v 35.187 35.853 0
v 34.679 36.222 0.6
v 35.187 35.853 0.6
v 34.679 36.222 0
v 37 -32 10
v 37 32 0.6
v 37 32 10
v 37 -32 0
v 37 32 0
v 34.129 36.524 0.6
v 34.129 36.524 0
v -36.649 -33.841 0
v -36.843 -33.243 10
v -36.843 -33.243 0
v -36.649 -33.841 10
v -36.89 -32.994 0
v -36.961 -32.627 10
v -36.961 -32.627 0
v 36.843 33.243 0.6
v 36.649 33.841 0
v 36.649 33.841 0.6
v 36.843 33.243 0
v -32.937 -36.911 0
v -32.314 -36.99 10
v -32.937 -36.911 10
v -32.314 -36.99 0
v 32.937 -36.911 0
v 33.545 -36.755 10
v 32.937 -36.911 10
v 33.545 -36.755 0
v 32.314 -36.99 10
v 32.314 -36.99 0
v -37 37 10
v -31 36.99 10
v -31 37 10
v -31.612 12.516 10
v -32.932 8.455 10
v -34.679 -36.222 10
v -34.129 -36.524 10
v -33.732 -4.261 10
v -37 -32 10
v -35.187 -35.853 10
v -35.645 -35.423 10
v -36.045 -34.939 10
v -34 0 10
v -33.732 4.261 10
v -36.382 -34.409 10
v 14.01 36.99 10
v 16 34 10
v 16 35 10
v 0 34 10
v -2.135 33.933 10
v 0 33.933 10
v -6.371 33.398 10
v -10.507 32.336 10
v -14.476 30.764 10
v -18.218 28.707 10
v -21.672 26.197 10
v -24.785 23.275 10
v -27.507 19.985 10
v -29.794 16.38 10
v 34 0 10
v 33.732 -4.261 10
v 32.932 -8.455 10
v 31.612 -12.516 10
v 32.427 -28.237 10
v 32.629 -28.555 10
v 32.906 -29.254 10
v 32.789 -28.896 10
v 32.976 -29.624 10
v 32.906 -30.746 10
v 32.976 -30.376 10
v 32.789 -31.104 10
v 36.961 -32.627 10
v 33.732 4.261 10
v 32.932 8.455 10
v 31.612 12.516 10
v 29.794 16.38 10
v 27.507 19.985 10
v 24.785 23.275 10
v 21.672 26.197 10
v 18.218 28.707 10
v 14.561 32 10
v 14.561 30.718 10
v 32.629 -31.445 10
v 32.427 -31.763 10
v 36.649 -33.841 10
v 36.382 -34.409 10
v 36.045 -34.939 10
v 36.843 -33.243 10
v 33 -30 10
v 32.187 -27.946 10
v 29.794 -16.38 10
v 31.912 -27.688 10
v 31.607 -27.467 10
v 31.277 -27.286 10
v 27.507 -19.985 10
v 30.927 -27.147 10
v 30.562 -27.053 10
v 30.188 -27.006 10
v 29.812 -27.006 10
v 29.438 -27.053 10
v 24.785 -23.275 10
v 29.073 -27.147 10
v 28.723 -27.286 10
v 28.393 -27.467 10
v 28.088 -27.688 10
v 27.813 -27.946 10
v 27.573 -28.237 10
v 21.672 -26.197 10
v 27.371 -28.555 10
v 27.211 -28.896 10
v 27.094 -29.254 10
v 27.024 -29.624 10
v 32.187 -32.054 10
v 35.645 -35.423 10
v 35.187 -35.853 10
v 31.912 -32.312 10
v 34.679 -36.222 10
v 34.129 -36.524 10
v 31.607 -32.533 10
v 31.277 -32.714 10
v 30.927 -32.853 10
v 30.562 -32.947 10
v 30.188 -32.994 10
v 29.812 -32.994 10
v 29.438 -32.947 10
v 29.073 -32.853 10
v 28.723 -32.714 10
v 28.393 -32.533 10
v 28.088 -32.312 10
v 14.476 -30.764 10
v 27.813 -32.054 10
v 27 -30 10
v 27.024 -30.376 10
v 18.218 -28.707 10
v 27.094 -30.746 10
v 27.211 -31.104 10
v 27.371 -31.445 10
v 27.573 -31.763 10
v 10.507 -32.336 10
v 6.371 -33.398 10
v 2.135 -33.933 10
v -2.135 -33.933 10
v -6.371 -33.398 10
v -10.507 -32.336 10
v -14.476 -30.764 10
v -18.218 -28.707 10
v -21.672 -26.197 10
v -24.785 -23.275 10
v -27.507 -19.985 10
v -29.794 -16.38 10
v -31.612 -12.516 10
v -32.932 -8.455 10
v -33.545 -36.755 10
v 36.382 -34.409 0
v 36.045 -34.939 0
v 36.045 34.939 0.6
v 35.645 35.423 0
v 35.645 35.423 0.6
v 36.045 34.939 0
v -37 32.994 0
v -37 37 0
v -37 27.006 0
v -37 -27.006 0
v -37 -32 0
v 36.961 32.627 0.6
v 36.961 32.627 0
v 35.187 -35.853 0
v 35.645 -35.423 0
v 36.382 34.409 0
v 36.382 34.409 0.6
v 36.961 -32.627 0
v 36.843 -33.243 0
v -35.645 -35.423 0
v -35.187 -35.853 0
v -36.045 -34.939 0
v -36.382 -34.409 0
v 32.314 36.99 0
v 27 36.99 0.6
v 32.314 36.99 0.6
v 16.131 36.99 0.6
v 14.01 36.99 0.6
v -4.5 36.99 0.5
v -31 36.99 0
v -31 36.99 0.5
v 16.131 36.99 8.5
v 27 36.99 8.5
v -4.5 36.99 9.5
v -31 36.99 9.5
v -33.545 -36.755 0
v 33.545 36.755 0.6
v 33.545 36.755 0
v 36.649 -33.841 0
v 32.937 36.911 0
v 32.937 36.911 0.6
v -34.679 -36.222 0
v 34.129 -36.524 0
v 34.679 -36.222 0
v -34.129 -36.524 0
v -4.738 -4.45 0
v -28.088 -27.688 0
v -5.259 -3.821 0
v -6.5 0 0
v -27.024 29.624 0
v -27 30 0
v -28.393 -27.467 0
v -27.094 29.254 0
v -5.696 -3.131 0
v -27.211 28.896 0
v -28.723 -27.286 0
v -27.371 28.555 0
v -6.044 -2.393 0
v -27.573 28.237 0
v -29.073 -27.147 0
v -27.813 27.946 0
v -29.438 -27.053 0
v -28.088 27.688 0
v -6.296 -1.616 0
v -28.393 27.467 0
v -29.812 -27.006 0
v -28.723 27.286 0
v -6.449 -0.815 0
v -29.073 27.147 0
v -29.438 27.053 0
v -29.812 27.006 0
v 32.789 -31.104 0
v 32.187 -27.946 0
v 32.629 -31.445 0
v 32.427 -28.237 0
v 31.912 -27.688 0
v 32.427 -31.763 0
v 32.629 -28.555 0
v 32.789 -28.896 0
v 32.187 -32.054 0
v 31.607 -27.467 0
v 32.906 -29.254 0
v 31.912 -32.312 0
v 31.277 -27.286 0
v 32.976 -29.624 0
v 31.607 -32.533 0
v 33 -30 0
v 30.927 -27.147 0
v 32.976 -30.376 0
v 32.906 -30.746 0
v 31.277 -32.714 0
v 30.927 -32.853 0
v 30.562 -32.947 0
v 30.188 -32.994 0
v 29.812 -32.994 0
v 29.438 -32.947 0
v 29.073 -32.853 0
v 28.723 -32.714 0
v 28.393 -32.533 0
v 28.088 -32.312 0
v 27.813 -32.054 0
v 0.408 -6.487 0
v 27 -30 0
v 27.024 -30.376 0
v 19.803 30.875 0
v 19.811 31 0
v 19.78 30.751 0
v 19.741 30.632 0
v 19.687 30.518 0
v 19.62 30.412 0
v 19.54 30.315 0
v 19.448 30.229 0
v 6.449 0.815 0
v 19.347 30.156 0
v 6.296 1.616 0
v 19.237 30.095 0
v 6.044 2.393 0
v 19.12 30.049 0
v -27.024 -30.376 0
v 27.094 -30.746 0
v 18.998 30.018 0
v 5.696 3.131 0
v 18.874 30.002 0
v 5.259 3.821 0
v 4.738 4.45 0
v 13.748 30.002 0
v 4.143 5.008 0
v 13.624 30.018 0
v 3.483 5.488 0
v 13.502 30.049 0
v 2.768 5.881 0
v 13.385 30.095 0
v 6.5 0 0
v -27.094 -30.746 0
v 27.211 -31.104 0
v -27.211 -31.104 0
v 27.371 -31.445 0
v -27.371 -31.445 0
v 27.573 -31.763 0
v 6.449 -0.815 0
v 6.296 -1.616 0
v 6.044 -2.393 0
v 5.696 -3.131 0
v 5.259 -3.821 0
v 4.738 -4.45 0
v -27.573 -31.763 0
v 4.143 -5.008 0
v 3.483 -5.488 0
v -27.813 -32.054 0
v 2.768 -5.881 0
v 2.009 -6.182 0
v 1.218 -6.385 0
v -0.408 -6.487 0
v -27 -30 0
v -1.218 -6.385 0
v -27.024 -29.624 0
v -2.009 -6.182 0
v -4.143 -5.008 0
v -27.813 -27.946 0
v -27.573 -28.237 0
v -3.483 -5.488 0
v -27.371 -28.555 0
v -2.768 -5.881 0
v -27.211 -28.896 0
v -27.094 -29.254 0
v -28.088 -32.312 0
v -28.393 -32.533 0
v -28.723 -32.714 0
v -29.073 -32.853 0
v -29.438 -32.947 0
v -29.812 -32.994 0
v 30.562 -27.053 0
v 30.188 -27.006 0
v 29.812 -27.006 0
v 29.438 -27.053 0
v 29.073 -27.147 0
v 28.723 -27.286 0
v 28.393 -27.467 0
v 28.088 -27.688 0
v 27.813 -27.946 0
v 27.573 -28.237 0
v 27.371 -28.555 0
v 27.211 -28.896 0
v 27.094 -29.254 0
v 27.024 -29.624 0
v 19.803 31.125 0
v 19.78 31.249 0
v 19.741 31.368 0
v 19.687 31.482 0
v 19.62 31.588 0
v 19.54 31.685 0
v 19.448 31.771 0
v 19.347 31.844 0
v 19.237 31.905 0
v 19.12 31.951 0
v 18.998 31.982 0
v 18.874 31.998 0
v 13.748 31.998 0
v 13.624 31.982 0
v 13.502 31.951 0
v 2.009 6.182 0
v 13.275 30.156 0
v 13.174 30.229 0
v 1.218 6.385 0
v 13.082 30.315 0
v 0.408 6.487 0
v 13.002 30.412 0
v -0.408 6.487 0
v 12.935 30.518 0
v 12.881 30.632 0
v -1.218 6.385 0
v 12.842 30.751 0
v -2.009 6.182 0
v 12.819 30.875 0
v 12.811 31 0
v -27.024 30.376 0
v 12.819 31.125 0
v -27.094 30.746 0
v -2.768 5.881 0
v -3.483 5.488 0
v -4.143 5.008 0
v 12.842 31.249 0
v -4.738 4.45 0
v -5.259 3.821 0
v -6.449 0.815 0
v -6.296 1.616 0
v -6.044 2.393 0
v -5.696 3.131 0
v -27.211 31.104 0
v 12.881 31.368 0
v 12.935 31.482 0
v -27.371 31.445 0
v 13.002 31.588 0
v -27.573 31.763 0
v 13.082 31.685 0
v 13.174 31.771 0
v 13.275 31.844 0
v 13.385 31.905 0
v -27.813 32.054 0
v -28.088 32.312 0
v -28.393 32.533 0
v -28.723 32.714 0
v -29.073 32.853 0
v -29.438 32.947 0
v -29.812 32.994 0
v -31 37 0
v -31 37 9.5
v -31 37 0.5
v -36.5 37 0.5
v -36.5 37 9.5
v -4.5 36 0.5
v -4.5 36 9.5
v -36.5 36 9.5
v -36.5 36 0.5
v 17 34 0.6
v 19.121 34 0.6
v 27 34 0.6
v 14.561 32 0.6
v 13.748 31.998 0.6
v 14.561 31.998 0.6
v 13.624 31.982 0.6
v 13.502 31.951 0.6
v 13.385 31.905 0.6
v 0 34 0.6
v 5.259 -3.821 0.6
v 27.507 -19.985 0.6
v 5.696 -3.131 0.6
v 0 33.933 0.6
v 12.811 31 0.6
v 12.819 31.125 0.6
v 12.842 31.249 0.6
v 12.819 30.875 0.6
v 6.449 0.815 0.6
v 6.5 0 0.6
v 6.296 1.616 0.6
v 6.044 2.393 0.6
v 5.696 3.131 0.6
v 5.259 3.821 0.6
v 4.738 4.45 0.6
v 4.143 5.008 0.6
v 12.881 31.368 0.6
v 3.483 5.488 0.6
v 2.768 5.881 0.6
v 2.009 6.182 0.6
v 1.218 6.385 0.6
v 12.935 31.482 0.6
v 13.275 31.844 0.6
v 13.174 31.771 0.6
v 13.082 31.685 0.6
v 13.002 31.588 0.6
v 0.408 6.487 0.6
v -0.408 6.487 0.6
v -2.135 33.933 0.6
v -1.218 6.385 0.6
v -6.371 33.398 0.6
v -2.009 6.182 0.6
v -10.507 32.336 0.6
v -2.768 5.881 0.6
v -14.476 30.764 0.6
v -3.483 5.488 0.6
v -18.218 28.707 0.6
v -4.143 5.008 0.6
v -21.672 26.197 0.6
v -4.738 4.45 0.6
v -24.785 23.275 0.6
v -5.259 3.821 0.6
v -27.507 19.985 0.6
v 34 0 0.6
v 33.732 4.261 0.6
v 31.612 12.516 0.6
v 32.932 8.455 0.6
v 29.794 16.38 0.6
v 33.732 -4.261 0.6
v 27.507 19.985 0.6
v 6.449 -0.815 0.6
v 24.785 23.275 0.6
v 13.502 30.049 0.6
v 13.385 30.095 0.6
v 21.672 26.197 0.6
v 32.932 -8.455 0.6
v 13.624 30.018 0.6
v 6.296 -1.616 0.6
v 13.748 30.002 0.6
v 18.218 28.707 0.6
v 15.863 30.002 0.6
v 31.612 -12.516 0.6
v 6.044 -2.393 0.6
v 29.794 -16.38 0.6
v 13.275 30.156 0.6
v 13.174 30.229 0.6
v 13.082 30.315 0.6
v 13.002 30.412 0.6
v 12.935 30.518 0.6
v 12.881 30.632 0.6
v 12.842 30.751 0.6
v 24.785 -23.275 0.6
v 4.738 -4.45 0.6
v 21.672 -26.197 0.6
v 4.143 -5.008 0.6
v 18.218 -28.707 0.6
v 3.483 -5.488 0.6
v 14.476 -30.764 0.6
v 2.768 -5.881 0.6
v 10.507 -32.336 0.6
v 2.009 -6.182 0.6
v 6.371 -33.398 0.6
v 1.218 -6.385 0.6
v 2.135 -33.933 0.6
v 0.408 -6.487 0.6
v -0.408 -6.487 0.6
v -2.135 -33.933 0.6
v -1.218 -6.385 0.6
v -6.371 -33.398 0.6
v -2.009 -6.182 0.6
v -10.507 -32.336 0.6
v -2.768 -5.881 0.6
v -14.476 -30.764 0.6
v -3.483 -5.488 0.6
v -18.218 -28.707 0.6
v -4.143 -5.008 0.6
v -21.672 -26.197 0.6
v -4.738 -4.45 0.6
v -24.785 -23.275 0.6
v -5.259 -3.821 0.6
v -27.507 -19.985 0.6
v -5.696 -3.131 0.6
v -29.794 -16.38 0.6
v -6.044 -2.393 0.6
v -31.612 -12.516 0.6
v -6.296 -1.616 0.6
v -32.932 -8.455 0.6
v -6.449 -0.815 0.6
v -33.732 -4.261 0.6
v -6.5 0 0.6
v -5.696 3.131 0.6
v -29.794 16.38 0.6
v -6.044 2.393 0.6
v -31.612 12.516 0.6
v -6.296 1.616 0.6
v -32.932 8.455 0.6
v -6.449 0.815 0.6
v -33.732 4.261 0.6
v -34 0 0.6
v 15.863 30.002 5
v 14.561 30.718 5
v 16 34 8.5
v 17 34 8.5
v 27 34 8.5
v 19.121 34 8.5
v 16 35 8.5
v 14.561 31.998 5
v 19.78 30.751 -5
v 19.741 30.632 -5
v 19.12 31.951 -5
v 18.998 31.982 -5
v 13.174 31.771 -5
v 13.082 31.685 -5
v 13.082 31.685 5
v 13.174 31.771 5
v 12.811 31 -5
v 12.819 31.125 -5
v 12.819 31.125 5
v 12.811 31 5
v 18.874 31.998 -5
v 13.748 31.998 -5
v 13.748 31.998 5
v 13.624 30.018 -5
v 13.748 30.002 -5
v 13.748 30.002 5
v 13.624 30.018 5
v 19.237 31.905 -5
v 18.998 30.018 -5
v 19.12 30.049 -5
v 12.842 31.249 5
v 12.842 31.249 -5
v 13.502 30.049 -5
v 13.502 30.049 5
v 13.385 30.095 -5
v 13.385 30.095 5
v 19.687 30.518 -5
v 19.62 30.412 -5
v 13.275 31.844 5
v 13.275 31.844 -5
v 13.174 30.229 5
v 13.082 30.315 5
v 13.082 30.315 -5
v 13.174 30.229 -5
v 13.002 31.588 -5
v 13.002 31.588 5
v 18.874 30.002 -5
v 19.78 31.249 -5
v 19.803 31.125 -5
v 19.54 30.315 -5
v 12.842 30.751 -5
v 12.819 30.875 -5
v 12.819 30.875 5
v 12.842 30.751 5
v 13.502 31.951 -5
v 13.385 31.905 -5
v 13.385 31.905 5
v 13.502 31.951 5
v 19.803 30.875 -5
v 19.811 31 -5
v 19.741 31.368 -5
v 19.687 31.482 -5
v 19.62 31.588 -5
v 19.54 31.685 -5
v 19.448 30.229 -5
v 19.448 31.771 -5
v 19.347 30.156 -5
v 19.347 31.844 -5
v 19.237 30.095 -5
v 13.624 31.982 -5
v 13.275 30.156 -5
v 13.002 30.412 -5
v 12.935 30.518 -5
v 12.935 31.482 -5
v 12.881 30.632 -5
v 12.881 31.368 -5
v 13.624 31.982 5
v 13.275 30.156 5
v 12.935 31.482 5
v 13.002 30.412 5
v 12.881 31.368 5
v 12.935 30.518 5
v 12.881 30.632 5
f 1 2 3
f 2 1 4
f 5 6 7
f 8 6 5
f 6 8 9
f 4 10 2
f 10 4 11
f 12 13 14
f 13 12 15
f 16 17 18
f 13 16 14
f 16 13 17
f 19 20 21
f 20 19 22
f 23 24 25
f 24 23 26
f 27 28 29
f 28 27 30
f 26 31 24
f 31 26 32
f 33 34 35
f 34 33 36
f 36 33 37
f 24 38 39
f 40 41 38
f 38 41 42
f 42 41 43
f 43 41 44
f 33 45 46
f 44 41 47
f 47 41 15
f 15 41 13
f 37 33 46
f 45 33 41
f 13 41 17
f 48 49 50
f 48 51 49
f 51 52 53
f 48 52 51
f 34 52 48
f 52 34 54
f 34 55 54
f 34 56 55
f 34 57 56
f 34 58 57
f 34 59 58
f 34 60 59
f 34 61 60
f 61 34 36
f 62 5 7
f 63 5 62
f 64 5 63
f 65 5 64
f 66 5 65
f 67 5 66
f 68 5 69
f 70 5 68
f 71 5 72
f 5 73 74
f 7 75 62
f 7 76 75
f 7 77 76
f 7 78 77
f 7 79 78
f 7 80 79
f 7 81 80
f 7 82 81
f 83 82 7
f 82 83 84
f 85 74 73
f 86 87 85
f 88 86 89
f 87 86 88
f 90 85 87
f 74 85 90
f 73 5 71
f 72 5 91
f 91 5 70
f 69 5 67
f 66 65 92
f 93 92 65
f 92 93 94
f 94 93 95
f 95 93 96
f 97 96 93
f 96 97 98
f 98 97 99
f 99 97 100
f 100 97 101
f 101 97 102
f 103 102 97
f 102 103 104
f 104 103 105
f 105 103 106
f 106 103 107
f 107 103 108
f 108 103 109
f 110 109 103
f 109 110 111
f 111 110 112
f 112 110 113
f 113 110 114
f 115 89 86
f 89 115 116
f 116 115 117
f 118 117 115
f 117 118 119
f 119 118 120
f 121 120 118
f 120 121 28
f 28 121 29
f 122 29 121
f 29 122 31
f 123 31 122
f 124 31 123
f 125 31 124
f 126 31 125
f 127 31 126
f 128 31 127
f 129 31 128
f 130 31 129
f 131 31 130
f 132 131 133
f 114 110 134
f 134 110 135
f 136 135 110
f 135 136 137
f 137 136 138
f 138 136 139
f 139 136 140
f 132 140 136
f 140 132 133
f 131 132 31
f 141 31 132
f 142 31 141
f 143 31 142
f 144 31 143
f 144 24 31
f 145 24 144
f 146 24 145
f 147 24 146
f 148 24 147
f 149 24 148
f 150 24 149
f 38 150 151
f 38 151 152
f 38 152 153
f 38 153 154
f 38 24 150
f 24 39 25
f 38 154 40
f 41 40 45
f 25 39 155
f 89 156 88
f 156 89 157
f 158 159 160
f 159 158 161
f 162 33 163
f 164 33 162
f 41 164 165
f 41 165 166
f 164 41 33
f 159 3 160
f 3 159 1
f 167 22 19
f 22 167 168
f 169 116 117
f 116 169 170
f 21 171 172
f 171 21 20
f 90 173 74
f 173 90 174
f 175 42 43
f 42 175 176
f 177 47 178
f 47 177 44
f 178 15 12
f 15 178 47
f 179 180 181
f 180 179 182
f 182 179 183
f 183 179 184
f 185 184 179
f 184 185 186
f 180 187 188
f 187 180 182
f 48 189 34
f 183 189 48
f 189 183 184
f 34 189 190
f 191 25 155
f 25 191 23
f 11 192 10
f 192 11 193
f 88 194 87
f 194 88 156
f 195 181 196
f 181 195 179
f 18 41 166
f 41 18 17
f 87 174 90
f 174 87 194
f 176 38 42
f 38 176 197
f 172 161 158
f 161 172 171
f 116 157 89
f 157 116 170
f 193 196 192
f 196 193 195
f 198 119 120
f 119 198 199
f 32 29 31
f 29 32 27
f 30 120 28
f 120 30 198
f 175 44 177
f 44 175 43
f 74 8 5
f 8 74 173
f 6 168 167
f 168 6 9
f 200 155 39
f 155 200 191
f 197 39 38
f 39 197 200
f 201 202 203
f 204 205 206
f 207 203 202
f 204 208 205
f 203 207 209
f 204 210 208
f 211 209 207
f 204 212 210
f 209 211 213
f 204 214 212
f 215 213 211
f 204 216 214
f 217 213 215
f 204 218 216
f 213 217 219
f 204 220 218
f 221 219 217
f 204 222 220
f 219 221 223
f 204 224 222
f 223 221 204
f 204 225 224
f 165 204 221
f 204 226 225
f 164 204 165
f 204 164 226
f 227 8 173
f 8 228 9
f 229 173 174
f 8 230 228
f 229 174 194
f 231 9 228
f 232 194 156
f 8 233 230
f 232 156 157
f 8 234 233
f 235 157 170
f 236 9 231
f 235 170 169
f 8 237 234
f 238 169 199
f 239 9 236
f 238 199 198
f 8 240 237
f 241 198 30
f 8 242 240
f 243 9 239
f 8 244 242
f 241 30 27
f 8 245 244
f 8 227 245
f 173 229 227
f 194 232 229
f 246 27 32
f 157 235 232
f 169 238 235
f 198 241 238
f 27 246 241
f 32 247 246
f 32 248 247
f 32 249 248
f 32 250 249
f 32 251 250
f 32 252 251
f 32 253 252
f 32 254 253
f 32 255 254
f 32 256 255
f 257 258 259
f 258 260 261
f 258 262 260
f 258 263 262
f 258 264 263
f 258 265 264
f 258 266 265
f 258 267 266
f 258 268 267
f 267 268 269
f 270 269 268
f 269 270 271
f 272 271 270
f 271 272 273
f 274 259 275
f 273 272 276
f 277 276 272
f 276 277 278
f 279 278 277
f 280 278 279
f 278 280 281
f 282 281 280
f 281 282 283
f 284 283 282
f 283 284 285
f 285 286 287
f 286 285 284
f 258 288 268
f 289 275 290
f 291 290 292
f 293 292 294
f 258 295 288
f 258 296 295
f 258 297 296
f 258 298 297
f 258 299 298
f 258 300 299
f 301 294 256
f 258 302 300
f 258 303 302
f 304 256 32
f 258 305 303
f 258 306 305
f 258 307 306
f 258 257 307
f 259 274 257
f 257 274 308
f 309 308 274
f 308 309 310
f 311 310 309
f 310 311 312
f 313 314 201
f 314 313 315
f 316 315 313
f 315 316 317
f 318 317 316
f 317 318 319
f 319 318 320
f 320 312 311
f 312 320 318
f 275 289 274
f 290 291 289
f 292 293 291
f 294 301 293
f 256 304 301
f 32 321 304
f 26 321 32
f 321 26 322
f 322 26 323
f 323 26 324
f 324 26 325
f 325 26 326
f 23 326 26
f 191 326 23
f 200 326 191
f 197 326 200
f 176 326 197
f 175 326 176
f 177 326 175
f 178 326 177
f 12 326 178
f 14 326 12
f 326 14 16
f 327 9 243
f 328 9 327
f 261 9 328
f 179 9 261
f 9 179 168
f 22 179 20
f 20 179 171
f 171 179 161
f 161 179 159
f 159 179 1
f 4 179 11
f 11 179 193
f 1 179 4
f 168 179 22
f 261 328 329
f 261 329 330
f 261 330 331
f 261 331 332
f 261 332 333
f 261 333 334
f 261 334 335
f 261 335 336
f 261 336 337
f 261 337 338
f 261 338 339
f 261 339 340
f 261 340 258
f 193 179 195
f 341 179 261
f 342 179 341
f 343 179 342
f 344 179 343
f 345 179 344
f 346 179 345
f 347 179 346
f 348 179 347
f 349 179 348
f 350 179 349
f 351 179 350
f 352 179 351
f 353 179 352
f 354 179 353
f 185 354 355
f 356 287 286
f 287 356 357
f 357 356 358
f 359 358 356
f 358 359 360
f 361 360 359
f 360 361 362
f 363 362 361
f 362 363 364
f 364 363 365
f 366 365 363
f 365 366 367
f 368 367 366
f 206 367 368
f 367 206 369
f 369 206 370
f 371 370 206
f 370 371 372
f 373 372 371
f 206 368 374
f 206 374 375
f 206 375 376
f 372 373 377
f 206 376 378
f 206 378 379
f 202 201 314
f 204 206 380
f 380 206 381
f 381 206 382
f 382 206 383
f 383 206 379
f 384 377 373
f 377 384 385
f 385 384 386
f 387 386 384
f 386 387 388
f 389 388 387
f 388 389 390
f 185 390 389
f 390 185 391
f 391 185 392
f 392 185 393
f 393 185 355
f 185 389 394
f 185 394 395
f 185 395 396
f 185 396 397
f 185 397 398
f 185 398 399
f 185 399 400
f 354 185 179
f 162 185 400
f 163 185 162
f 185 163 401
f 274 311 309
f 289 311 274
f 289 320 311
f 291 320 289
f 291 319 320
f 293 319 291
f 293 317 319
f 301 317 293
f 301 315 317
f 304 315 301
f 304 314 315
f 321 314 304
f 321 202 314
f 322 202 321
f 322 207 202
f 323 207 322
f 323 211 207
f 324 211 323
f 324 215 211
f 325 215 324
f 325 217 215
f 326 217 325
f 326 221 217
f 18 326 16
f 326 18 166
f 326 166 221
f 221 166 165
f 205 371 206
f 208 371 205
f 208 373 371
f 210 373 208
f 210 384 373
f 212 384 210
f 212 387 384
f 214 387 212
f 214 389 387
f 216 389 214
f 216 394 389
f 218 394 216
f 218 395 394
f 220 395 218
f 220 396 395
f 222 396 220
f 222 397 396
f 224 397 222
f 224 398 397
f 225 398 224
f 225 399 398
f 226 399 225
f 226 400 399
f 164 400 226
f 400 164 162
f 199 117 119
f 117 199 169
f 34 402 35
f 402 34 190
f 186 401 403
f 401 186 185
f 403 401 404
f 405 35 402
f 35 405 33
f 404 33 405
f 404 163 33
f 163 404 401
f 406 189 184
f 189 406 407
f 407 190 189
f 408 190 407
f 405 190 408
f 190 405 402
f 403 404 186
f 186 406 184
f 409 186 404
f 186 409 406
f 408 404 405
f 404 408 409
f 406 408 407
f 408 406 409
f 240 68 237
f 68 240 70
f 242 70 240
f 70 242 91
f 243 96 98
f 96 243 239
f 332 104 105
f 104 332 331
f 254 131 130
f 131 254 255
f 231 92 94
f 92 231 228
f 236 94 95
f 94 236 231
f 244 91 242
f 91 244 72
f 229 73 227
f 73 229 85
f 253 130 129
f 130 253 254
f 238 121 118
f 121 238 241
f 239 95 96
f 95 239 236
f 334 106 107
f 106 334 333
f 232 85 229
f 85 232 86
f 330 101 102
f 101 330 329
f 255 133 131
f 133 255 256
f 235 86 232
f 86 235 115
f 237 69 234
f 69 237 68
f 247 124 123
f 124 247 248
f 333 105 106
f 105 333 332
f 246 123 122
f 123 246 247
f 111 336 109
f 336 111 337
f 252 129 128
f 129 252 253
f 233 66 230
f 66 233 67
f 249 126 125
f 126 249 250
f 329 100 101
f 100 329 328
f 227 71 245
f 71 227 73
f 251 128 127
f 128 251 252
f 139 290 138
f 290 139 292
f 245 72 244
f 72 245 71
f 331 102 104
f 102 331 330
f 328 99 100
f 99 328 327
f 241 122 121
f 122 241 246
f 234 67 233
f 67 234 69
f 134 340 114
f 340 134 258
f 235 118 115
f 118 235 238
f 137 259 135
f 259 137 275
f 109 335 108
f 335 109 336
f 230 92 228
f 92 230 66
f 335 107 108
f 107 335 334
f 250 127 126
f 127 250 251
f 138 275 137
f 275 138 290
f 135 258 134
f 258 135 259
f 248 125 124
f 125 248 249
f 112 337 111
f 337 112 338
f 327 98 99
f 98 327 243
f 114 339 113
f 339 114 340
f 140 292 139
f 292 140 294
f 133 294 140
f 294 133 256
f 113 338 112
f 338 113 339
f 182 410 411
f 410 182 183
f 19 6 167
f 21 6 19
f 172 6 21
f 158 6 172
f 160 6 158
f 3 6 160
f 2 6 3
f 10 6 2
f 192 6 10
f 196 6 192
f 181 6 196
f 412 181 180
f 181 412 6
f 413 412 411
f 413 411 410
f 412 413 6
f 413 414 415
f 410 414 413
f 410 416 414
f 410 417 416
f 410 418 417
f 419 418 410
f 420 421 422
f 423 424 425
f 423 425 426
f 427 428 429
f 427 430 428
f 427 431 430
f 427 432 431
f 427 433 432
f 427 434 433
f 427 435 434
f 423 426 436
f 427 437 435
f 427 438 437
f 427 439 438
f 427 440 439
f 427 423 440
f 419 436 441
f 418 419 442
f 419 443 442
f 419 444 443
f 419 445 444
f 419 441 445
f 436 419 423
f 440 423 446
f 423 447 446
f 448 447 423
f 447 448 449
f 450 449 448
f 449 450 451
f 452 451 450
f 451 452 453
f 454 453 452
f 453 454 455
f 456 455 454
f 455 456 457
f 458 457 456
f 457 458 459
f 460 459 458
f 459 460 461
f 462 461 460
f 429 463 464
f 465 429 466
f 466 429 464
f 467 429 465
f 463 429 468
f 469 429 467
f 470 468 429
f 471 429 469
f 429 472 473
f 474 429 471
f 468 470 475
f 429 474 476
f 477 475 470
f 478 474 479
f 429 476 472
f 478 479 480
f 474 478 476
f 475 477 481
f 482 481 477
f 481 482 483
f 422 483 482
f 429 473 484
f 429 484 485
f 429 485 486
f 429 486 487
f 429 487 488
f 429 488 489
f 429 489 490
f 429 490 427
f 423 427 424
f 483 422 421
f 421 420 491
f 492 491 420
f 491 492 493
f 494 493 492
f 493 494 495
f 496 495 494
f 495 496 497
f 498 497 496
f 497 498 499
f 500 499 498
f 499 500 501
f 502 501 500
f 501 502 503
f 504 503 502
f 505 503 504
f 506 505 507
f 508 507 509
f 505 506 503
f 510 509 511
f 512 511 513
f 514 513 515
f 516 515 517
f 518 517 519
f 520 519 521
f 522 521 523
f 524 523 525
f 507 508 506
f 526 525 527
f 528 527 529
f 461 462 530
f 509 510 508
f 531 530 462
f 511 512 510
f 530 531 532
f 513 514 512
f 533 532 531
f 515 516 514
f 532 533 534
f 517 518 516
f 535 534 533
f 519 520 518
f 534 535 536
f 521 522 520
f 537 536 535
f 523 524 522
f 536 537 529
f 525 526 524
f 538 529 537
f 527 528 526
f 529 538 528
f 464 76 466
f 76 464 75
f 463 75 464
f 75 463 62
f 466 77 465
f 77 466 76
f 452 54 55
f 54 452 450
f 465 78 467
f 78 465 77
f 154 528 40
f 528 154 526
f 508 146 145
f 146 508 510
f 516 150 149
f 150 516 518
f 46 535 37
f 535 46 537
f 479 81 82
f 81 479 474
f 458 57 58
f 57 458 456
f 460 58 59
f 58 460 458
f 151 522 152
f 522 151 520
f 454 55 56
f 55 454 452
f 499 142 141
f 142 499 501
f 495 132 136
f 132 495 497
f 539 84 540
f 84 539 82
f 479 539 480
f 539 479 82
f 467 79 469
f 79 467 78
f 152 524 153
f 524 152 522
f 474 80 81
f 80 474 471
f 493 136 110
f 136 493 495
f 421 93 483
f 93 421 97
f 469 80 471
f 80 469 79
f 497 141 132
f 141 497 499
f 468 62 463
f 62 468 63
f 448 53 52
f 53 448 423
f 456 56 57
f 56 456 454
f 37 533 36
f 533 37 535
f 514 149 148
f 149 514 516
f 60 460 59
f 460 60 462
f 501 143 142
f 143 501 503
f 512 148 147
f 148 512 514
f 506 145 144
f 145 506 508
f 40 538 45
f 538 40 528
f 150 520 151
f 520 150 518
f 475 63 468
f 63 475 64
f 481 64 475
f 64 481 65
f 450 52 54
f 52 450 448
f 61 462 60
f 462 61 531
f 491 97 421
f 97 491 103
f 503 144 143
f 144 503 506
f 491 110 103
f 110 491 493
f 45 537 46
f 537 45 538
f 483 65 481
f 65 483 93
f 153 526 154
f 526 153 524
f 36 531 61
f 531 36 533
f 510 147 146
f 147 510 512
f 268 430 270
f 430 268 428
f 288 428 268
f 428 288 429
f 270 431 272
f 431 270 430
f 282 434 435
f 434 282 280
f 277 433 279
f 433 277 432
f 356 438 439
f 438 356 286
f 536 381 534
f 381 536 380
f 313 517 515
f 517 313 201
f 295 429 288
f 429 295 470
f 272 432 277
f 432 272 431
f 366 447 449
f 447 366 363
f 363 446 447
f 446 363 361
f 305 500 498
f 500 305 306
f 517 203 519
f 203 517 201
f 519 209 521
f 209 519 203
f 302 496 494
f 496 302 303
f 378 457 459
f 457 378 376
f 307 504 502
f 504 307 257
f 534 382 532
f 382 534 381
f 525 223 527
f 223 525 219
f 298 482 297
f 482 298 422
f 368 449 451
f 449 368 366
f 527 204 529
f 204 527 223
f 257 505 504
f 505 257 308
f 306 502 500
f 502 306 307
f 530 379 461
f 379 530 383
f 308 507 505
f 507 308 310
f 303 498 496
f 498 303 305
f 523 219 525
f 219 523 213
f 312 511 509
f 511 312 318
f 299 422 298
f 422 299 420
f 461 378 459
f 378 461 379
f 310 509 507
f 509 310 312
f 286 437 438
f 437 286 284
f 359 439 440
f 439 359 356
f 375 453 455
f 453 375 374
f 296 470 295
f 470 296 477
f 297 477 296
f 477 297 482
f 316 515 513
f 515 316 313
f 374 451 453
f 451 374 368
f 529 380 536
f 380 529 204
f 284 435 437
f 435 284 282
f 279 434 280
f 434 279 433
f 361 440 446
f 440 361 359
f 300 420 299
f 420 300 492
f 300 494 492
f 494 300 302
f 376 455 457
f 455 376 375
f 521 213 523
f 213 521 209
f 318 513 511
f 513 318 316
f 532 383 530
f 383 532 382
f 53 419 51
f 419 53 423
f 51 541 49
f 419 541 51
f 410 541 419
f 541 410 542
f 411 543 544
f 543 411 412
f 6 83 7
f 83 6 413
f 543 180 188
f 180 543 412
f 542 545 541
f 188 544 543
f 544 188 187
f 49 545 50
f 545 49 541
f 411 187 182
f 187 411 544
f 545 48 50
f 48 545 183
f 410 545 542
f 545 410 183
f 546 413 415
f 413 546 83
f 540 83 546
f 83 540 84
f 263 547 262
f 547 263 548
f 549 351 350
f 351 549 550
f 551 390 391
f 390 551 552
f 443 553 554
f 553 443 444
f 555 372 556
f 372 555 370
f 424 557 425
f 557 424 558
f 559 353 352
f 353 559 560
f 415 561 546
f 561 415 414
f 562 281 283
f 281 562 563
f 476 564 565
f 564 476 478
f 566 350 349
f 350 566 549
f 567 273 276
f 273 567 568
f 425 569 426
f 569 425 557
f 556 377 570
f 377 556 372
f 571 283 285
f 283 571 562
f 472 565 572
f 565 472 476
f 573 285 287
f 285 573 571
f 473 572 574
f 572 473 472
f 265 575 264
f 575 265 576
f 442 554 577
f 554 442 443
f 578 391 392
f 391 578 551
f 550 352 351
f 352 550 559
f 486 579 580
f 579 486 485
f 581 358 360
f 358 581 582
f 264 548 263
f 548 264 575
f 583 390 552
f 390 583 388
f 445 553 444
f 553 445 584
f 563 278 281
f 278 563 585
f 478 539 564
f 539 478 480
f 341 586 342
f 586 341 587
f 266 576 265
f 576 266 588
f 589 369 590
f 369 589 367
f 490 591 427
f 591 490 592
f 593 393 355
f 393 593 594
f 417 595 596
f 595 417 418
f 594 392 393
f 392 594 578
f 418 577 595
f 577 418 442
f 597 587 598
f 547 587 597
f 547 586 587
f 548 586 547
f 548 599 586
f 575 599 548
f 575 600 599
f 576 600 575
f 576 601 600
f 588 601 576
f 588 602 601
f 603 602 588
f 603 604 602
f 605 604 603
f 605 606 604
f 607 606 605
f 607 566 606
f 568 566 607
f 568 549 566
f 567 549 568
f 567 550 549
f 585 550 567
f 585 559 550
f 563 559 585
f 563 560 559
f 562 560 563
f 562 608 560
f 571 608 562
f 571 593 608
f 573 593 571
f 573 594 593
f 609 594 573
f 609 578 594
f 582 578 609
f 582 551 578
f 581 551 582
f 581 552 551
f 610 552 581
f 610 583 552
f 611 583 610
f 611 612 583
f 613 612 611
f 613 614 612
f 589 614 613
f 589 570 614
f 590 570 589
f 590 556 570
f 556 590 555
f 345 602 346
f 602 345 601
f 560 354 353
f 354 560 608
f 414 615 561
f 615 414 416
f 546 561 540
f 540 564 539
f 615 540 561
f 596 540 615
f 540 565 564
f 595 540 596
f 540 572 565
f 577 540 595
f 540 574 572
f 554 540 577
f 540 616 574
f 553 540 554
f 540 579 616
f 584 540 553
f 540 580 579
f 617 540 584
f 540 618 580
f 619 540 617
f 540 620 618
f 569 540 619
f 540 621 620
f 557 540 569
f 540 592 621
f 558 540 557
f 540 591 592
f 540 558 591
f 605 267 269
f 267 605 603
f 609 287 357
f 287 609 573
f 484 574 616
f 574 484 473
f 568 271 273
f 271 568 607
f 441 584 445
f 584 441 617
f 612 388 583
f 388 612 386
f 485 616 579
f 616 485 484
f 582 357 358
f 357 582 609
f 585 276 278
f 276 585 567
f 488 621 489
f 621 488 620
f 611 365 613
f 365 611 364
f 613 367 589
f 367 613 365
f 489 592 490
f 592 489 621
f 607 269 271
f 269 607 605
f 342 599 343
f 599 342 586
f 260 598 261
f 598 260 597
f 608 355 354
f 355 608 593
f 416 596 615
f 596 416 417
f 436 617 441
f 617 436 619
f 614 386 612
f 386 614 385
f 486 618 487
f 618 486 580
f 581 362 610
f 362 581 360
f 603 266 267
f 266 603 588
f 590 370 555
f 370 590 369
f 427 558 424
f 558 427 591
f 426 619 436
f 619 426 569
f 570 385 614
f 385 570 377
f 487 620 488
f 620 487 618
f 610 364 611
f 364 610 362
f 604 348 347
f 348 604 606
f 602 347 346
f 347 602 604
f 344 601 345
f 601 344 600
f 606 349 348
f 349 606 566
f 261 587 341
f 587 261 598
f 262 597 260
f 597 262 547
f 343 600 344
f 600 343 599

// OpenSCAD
$fn = 50;


union() {
	difference() {
		union() {
			hull() {
				translate(v = [-32.0000000000, 32.0000000000, 0]) {
					cylinder(h = 10, r = 5);
				}
				translate(v = [32.0000000000, 32.0000000000, 0]) {
					cylinder(h = 10, r = 5);
				}
				translate(v = [-32.0000000000, -32.0000000000, 0]) {
					cylinder(h = 10, r = 5);
				}
				translate(v = [32.0000000000, -32.0000000000, 0]) {
					cylinder(h = 10, r = 5);
				}
			}
			translate(v = [-37.0000000000, 31.0000000000, 0]) {
				cube(size = [6, 6, 10]);
			}
		}
		union() {
			translate(v = [-37.5000000000, -30.0000000000, -250.0000000000]) {
				rotate(a = [0, 0, 0]) {
					difference() {
						union() {
							hull() {
								translate(v = [7.5000000000, 0, 0]) {
									cylinder(h = 250, r = 3.0000000000, r1 = 3.0000000000, r2 = 3.0000000000);
								}
								translate(v = [-7.5000000000, 0, 0]) {
									cylinder(h = 250, r = 3.0000000000, r1 = 3.0000000000, r2 = 3.0000000000);
								}
							}
						}
						union();
					}
				}
			}
			translate(v = [-37.5000000000, 30.0000000000, -250.0000000000]) {
				rotate(a = [0, 0, 0]) {
					difference() {
						union() {
							hull() {
								translate(v = [7.5000000000, 0, 0]) {
									cylinder(h = 250, r = 3.0000000000, r1 = 3.0000000000, r2 = 3.0000000000);
								}
								translate(v = [-7.5000000000, 0, 0]) {
									cylinder(h = 250, r = 3.0000000000, r1 = 3.0000000000, r2 = 3.0000000000);
								}
							}
						}
						union();
					}
				}
			}
			translate(v = [-36.5000000000, 36.0000000000, 0.5000000000]) {
				cube(size = [32, 1, 9.0000000000]);
			}
			translate(v = [30.0000000000, -30.0000000000, 0]) {
				cylinder(h = 100, r = 3.0000000000);
			}
			translate(v = [0, 0, 0.6000000000]) {
				cylinder(h = 12.4000000000, r = 34.0000000000);
			}
			translate(v = [0, 0, -5.0000000000]) {
				cylinder(h = 10, r = 6.5000000000);
			}
			translate(v = [0.0000000000, 32.0000000000, 0.6000000000]) {
				cube(size = [37.0000000000, 2, 12.4000000000]);
			}
			translate(v = [27.0000000000, 32.0000000000, 0.6000000000]) {
				cube(size = [10, 5, 12.4000000000]);
			}
			translate(v = [16.0000000000, 32.0000000000, 8.5000000000]) {
				cube(size = [21, 5, 1.5000000000]);
			}
			translate(v = [13.2500000000, 37.7500000000, 0.6000000000]) {
				rotate(a = [0, 0, -45]) {
					cube(size = [7.5000000000, 1.5000000000, 12.4000000000]);
				}
			}
			translate(v = [7.0610000000, 30.0000000000, 0.6000000000]) {
				cube(size = [7.5000000000, 2, 9.4000000000]);
			}
		}
	}
	union() {
		translate(v = [16.3110000000, 31.0000000000, -5.0000000000]) {
			rotate(a = [0, 0, 0]) {
				difference() {
					union() {
						#hull() {
							#translate(v = [2.5000000000, 0, 0]) {
								cylinder(h = 10, r = 1.0000000000, r1 = 1.0000000000, r2 = 1.0000000000);
							}
							#translate(v = [-2.5000000000, 0, 0]) {
								cylinder(h = 10, r = 1.0000000000, r1 = 1.0000000000, r2 = 1.0000000000);
							}
						}
					}
					union();
				}
			}
		}
	}
}
